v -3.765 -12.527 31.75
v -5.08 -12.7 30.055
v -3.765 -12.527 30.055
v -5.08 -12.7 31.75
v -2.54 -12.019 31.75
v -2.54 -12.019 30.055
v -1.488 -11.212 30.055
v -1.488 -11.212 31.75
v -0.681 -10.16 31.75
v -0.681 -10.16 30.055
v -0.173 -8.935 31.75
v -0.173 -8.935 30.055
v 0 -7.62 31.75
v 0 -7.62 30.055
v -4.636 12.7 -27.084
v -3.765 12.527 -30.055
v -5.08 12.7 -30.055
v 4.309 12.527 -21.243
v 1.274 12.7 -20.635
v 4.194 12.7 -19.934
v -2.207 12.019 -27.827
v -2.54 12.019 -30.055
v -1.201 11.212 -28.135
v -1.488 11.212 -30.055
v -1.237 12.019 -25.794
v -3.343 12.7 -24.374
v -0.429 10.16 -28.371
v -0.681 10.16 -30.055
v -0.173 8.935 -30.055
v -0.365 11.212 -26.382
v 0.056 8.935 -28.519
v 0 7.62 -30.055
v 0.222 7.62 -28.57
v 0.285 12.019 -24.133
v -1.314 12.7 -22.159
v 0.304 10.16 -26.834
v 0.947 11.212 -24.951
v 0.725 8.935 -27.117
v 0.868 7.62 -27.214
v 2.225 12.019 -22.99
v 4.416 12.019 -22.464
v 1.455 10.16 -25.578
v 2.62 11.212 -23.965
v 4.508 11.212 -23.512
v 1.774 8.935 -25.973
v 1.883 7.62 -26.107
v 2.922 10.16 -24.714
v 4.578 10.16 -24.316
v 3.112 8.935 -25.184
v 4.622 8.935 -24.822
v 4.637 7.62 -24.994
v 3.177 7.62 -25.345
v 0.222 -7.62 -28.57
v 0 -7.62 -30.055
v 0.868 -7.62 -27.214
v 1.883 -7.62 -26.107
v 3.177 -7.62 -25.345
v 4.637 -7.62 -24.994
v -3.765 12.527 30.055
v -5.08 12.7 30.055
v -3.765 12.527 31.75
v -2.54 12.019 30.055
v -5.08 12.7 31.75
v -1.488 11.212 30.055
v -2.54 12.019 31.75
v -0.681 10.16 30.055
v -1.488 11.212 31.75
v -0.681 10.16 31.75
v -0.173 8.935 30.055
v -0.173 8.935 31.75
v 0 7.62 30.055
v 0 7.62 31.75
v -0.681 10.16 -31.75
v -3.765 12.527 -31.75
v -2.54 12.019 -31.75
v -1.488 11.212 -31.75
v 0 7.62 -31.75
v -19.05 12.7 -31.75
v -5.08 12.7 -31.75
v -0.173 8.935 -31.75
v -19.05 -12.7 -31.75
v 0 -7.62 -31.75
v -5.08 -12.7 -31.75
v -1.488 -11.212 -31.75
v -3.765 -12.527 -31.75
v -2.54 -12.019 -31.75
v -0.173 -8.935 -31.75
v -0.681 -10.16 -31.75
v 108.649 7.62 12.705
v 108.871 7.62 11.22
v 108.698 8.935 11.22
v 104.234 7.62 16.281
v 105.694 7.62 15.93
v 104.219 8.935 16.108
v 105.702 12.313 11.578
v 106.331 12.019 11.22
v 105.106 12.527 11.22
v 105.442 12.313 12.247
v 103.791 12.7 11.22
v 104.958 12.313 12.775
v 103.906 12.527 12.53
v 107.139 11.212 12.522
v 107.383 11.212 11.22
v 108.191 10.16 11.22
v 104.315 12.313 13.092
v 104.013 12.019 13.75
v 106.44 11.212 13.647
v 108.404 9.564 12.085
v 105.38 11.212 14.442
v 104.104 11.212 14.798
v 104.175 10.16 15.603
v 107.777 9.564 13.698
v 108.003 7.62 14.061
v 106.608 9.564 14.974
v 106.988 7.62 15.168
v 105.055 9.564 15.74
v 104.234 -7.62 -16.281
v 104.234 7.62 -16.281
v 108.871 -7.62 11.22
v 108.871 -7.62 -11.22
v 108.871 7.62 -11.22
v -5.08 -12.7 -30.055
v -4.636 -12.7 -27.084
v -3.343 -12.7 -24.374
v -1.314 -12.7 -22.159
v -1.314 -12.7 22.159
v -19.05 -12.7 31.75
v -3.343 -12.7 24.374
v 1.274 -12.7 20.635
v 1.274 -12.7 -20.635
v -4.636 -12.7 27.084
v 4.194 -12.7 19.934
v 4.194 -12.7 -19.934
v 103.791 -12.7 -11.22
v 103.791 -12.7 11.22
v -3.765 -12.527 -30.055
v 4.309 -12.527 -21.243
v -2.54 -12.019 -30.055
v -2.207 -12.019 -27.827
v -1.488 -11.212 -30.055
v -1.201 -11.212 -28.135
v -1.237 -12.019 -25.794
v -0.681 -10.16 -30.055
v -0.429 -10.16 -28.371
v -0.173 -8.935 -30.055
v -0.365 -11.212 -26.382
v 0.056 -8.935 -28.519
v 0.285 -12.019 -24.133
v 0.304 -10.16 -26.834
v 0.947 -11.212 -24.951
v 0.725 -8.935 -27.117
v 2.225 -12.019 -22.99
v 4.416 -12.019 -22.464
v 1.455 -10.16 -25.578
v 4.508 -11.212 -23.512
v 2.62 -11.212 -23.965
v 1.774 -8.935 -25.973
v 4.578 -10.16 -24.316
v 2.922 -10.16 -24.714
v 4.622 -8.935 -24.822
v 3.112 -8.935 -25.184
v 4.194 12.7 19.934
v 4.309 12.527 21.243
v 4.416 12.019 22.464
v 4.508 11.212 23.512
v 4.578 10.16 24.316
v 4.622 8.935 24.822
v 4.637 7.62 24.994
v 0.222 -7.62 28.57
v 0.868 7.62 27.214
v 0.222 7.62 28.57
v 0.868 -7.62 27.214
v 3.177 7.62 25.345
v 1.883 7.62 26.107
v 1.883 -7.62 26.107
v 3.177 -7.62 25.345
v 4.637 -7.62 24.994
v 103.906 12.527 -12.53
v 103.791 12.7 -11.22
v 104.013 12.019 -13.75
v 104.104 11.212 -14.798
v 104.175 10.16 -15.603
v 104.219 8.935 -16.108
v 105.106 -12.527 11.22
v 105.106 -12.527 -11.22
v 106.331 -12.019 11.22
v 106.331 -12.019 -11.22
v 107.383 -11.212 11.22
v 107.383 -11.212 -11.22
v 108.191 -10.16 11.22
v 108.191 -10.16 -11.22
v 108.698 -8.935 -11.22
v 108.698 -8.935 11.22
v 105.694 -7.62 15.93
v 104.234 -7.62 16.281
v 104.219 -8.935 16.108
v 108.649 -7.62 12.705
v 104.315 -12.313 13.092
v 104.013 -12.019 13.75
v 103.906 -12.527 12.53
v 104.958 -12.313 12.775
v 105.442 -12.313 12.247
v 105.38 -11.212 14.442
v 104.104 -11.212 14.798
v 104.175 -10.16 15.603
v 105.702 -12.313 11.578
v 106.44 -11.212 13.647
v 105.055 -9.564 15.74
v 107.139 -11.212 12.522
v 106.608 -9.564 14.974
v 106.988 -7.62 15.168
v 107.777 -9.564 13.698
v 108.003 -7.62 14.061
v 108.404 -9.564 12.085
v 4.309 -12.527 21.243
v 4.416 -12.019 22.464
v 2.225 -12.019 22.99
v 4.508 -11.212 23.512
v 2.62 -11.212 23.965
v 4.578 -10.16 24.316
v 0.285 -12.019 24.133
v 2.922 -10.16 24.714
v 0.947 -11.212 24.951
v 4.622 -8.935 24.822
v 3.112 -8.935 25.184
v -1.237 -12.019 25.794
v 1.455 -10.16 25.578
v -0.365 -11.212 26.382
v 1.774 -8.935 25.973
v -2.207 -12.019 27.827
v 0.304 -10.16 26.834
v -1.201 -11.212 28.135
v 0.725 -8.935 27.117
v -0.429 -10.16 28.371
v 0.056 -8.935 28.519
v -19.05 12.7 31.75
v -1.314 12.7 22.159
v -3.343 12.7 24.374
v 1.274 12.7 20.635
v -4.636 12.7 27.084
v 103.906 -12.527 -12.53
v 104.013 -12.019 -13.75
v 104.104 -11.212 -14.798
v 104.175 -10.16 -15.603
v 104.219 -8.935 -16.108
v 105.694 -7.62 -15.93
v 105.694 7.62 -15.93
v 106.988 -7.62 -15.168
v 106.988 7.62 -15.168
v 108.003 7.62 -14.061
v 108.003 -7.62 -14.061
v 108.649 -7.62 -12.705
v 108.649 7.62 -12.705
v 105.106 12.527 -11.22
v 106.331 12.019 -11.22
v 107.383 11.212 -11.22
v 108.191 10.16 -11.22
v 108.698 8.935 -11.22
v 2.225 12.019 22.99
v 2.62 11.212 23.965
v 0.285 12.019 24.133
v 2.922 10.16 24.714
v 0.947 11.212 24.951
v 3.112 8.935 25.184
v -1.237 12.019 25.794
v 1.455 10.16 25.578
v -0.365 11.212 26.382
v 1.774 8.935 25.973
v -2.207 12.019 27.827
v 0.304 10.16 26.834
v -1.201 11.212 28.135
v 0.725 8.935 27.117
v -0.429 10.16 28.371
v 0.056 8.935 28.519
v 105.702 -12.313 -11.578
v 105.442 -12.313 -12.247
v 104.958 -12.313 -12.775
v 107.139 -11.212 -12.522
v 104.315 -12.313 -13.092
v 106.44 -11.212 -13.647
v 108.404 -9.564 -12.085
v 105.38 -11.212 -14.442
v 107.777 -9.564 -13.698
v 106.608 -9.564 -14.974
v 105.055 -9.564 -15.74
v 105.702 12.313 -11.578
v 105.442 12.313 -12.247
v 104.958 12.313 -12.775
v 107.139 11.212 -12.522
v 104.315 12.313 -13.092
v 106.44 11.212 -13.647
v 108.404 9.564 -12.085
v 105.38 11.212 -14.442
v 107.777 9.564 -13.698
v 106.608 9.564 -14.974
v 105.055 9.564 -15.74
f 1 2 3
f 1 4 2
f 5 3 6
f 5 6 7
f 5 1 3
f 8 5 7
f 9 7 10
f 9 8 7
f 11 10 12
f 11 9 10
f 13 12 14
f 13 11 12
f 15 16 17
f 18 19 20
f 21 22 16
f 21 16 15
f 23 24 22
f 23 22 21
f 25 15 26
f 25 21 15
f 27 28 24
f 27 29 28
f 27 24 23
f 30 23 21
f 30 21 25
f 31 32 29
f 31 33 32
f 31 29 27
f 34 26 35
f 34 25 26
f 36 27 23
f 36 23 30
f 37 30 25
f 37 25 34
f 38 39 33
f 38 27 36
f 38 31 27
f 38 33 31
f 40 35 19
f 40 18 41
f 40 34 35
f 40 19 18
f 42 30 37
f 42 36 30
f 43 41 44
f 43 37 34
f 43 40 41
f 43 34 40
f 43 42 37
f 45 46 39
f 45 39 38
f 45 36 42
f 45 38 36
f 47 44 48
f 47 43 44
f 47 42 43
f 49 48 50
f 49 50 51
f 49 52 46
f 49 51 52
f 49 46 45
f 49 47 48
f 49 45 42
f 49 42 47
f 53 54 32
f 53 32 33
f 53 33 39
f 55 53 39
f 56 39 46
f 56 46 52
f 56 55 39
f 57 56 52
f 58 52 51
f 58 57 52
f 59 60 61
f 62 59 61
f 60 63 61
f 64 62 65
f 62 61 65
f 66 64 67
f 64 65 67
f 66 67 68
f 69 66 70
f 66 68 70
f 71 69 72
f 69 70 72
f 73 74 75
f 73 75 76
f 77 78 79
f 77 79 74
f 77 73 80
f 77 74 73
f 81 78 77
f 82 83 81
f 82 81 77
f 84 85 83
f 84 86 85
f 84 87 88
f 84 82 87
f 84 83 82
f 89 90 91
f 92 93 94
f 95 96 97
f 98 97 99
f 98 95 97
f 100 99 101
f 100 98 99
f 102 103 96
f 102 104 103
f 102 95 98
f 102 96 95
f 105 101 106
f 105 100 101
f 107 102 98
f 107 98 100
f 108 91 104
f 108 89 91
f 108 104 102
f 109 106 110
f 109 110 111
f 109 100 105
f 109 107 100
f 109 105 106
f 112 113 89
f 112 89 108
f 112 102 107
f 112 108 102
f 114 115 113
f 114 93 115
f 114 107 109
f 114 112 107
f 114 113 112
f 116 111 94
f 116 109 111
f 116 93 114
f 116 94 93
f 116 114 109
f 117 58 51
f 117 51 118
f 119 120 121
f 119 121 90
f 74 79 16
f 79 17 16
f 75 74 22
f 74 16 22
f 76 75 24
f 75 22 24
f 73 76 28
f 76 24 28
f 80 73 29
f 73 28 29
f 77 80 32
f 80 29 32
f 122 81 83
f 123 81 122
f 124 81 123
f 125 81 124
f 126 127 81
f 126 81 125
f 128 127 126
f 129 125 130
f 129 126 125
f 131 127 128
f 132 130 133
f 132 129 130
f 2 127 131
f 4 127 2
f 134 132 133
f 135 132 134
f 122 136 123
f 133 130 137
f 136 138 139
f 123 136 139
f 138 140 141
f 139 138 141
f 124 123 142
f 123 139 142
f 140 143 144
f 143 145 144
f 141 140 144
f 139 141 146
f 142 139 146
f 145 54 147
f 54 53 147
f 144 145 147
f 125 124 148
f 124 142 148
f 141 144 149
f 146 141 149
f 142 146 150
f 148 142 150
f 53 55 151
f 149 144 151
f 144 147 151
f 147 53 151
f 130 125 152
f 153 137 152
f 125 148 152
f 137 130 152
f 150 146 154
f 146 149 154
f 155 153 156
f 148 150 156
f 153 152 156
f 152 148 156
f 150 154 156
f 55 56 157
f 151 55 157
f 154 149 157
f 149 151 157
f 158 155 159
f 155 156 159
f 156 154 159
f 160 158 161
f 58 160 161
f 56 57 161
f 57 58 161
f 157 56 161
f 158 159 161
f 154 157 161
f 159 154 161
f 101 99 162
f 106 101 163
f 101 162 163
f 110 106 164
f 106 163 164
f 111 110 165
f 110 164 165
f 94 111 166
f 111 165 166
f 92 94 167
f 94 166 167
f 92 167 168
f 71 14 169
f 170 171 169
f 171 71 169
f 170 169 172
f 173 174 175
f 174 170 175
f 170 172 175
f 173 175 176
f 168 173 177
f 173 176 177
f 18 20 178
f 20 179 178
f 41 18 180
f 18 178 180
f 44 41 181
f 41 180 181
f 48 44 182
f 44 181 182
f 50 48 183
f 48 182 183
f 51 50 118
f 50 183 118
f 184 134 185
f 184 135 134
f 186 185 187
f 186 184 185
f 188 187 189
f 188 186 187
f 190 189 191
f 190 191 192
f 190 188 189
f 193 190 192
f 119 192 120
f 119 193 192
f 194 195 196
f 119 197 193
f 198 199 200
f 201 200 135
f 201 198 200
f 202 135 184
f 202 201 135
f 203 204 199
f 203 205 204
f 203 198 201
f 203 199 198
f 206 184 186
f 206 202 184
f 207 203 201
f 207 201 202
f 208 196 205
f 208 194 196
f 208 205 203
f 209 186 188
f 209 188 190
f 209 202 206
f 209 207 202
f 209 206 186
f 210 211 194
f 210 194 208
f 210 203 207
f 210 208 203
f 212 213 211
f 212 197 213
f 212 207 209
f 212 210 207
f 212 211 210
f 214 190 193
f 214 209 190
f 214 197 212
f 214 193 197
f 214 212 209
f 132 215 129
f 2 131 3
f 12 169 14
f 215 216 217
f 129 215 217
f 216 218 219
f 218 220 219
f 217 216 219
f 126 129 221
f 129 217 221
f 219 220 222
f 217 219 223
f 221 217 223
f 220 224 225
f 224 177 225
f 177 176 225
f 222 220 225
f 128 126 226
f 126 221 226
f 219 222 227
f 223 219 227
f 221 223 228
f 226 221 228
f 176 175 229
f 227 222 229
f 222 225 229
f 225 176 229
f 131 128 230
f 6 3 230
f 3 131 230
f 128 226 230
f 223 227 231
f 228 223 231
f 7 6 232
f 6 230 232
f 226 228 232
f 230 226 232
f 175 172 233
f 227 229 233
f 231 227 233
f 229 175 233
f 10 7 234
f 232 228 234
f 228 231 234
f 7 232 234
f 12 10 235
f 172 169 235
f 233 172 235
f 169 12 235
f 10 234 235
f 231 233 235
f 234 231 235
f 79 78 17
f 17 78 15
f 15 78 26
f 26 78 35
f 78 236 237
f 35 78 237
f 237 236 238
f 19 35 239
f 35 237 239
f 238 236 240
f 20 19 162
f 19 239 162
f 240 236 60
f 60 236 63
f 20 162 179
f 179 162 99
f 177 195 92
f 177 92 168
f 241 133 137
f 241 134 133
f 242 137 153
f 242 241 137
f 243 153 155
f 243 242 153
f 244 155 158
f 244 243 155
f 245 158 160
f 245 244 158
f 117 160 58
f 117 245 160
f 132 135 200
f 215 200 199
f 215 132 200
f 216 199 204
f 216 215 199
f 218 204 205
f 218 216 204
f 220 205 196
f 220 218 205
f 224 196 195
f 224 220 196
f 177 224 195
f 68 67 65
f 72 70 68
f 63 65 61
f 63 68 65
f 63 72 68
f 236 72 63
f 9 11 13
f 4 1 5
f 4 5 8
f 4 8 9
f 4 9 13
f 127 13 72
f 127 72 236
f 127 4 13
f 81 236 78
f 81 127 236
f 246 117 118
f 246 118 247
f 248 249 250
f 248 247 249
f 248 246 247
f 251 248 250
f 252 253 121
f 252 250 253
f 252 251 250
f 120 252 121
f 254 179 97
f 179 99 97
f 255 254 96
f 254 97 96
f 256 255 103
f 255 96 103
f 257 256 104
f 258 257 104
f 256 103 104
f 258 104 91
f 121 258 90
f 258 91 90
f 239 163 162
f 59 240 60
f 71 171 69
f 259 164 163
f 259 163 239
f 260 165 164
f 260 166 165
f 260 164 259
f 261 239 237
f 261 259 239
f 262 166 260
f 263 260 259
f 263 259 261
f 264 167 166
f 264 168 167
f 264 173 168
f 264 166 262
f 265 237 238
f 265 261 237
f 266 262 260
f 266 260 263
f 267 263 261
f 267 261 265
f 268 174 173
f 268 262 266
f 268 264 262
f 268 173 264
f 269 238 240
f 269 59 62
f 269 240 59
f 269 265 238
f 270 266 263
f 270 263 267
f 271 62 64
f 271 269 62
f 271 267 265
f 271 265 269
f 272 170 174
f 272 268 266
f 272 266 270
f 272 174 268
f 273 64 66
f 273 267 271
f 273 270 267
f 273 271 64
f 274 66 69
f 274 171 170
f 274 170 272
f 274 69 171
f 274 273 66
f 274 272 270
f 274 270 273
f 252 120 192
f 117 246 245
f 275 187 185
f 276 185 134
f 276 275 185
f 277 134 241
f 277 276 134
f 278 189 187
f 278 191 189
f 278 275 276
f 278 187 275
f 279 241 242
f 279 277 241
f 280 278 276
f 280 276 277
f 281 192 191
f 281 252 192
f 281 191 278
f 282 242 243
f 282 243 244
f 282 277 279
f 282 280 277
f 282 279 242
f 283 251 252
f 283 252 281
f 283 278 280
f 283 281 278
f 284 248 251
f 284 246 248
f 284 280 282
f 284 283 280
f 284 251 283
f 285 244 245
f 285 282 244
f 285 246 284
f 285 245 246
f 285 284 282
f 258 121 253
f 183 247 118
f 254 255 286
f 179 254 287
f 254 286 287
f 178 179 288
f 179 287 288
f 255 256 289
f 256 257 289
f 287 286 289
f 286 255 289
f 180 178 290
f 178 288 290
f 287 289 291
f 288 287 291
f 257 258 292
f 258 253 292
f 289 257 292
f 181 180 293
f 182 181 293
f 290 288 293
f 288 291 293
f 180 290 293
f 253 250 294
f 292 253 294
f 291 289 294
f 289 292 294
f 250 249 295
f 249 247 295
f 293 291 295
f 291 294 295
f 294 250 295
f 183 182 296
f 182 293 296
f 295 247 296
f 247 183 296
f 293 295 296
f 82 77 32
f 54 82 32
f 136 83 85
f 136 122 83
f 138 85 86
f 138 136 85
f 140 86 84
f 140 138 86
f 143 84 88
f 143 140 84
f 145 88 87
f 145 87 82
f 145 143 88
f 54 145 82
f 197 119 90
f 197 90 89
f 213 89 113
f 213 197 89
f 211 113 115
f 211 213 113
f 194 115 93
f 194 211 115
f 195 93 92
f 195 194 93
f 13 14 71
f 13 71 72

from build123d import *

# Parameters (mm, degrees)
F1_DEPTH = 12.7
F2_R     = 5.08
F3_R     = 5.08


with BuildPart() as f1:
    # F0 (on Front) → F1 (new body, symmetric)
    with BuildSketch(Plane.XZ):
        Polygon((0, -31.75), (0, -25.4), (0, 25.4), (0, 31.75), (-19.05, 31.75), (-19.05, -31.75), align=None)
        Polygon((0, 25.4), (0, -25.4), (108.871248, -15.875), (108.871248, 15.875), align=None)
    extrude(amount=F1_DEPTH, both=True)

    # F2
    f2_edges = [f1.edges().sort_by_distance(p)[0] for p in [
        (0, 0, 25.4),
        (0, 0, -25.4),
    ]]
    fillet(f2_edges, radius=F2_R)

    # F3
    f3_edges = [f1.edges().sort_by_distance(p)[0] for p in [
        (56.754249, 12.7, 20.434647),
        (108.871248, 0, 15.875),
        (56.754249, -12.7, 20.434647),
        (108.871248, -12.7, 0),
        (108.871248, 12.7, 0),
        (56.754249, -12.7, -20.434647),
        (56.754249, 12.7, -20.434647),
        (108.871248, 0, -15.875),
    ]]
    fillet(f3_edges, radius=F3_R)


solid = f1.part
